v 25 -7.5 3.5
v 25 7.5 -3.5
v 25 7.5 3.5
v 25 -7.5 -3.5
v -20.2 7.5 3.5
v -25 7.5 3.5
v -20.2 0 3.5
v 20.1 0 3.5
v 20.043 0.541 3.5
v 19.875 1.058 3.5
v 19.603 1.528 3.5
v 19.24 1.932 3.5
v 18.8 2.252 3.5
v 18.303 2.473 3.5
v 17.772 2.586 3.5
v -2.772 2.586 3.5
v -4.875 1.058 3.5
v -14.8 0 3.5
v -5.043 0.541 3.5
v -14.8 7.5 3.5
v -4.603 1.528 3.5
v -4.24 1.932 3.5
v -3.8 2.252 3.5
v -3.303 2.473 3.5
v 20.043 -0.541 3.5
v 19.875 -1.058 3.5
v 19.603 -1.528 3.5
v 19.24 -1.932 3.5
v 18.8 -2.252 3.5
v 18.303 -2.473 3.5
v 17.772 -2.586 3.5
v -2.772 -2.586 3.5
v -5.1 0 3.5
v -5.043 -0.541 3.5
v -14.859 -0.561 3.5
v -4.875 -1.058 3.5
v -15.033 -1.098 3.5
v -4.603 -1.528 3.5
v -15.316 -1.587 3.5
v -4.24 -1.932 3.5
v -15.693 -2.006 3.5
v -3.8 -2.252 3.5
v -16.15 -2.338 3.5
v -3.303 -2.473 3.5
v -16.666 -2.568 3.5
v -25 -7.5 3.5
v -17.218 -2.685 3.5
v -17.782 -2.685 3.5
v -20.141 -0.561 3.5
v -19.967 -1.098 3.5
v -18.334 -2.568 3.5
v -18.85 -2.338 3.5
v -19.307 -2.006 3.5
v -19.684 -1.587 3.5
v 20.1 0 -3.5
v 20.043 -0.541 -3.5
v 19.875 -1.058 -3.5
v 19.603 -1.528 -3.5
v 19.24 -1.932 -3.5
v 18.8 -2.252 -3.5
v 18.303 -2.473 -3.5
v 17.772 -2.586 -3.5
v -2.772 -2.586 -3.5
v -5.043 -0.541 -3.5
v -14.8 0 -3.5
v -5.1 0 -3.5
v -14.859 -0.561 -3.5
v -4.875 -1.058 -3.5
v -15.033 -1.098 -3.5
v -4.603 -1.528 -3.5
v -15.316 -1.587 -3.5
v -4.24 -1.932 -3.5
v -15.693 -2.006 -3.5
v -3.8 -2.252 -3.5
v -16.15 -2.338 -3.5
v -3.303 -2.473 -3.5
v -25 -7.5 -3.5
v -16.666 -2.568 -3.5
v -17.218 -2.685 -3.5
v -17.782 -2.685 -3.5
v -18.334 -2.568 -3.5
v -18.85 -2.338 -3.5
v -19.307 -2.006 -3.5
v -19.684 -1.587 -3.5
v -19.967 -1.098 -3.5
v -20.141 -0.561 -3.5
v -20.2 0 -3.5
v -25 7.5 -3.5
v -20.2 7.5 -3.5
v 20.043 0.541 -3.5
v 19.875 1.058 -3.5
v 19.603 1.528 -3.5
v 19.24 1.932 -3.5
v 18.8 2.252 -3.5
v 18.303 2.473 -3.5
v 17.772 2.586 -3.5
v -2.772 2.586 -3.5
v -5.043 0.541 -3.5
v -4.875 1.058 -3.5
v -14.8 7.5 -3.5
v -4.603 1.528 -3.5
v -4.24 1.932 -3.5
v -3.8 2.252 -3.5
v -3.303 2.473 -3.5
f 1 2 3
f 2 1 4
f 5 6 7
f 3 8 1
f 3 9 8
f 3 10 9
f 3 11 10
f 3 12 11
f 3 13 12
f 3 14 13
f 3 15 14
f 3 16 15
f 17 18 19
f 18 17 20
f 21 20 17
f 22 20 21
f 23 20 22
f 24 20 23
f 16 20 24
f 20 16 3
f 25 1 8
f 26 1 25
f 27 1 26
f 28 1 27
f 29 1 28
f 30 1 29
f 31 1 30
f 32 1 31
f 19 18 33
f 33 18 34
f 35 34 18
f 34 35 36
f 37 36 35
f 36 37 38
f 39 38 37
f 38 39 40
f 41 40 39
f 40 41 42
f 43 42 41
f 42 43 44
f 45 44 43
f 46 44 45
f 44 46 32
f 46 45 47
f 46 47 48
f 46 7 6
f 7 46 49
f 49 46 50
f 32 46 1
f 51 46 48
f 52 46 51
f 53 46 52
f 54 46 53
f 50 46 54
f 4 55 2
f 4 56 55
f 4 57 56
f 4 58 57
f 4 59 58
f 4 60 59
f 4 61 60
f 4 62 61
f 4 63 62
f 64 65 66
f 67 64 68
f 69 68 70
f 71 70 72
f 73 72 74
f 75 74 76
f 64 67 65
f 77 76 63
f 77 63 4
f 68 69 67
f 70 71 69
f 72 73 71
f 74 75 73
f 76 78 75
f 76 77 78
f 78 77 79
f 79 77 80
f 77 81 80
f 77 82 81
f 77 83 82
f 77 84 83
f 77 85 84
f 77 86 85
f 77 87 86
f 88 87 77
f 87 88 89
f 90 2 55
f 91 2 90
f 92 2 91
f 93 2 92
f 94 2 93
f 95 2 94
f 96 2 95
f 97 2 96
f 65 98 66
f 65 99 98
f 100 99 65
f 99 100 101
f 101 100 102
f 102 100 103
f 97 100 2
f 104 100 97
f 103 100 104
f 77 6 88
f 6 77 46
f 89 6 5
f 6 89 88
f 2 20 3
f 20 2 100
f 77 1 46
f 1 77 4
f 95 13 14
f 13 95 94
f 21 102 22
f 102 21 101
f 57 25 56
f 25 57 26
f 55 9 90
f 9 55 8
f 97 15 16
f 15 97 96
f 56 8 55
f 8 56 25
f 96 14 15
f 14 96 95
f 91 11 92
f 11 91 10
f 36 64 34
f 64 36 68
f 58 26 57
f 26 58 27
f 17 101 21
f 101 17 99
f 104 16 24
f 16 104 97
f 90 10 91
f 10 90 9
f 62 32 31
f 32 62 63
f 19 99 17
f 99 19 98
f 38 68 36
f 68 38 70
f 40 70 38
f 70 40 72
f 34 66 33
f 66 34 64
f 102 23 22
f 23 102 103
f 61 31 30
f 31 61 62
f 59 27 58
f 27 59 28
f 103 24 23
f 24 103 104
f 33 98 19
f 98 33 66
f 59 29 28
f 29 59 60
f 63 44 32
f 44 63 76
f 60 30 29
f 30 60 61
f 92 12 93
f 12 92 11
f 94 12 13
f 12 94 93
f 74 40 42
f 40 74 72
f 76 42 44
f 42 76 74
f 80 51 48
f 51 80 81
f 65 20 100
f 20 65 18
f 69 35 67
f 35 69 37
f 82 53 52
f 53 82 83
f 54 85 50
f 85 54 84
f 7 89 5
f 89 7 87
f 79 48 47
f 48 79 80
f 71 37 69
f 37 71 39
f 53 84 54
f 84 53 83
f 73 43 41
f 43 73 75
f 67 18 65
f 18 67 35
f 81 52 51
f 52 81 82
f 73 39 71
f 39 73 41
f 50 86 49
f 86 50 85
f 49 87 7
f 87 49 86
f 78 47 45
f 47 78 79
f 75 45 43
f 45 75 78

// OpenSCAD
$fn=30;

hook();

module hook (length=50,height=7) {

    hookLength=15;
    slotWidth = length - hookLength - 15;

    difference() {
        cube([length, 15, height], center = true);

        translate([-slotWidth/2 + hookLength/2,0,0]) {
            hull() {
                translate([0, 0, 0]) {
                    cylinder(d = 5.2, h = height + 0.01, center = true);
                }

                translate([slotWidth, 0, 0]) {
                    cylinder(d = 5.2, h = height + 0.01, center = true);
                }
            }
        }

        translate([-length / 2 + 7.5, 0, 0]) {
            hull() {
                cylinder(d = 5.4, h = height+0.1, center = true);
                translate([0, 5, 0]) {
                    cube([5.4, 10, height+.1], center = true);
                }
            }
        }
    }
}
